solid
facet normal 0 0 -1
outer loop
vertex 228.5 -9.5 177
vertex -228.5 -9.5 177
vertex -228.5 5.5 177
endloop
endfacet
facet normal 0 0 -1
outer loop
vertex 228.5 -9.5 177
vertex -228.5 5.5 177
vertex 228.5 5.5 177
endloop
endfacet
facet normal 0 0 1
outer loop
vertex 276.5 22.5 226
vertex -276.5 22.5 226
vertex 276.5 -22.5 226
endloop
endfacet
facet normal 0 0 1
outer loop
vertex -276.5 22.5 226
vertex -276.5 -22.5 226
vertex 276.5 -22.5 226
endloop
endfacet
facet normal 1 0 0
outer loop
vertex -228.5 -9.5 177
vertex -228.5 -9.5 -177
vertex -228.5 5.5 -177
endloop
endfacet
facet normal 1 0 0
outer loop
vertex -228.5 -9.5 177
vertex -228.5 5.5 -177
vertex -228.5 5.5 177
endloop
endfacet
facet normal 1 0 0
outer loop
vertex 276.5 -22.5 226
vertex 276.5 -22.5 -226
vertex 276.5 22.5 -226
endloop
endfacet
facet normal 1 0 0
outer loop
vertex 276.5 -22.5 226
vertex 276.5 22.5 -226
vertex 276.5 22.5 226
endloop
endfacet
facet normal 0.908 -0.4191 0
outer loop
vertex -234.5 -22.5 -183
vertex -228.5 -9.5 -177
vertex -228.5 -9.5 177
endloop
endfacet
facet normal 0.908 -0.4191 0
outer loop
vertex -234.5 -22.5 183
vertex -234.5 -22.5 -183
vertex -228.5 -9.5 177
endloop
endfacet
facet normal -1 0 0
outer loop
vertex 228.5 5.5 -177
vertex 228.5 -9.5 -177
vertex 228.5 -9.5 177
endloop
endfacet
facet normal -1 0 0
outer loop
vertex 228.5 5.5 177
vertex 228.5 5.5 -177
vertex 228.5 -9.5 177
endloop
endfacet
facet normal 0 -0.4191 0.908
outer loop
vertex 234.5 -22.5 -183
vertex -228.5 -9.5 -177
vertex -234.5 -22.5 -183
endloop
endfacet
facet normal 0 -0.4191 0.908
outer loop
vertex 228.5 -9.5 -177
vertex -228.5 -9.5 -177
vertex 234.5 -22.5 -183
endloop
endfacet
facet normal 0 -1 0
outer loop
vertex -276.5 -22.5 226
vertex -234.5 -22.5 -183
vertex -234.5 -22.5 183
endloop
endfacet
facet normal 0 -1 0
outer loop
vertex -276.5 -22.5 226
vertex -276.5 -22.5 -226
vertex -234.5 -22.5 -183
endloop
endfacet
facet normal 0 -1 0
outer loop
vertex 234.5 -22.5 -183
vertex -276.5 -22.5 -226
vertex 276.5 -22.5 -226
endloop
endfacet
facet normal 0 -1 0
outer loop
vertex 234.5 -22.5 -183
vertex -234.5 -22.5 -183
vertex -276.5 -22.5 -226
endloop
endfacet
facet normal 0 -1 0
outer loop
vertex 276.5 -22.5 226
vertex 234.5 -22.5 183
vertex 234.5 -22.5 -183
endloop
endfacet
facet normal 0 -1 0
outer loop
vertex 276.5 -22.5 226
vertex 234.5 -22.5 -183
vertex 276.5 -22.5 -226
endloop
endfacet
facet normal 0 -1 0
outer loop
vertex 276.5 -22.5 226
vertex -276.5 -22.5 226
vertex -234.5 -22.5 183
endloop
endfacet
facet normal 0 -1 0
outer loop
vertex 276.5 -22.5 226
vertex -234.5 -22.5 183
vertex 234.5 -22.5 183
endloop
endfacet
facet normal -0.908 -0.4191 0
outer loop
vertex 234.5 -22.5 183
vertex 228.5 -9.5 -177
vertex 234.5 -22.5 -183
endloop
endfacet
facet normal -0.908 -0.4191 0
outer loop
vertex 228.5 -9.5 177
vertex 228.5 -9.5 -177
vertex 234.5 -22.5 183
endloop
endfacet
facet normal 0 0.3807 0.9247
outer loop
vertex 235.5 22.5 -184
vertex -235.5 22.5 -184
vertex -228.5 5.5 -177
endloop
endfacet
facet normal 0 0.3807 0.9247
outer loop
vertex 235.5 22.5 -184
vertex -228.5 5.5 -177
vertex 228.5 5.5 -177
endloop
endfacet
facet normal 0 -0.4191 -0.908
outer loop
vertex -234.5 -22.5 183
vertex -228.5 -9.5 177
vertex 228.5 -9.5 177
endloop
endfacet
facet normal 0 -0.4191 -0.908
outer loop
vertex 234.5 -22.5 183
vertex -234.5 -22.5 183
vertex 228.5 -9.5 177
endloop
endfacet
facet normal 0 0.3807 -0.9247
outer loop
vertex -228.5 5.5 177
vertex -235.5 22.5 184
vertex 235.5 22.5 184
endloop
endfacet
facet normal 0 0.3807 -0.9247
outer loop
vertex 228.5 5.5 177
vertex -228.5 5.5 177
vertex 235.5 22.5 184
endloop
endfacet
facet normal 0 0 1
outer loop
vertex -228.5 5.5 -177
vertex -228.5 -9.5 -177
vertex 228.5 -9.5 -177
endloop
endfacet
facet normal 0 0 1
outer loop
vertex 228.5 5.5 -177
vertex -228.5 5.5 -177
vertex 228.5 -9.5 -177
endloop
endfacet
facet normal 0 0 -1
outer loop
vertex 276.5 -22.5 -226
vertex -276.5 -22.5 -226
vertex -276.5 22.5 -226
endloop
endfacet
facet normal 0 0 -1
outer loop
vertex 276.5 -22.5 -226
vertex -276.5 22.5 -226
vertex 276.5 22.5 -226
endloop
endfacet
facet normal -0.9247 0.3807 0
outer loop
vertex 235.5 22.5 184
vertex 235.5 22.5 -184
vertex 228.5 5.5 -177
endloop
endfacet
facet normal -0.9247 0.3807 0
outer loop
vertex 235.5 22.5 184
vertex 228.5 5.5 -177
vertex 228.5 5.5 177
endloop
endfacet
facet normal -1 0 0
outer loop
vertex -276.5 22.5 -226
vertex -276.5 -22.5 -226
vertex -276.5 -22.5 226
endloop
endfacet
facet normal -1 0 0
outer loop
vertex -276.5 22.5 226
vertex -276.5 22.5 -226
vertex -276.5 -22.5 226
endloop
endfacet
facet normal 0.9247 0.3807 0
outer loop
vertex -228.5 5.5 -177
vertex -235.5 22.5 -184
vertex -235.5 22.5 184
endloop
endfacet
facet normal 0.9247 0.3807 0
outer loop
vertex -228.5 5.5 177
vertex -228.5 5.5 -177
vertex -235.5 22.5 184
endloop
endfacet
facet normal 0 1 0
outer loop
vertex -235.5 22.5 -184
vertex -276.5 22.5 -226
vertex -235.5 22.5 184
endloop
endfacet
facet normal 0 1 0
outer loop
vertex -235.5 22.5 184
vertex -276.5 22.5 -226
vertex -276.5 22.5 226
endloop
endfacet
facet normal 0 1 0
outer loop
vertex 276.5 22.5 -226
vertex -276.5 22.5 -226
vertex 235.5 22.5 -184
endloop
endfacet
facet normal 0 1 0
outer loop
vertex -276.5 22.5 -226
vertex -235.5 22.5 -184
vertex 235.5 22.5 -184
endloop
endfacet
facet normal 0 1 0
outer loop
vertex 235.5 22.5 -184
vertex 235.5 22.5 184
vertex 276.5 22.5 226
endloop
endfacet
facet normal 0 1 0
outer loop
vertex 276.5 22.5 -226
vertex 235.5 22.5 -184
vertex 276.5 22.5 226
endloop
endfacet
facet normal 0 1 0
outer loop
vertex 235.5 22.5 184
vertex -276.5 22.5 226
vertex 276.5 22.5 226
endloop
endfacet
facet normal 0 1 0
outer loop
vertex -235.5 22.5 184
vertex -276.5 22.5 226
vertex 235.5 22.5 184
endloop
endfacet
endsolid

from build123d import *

# Parameters (mm, degrees)
F0_W     = 553
F0_H     = 452
F0_W_2   = 457
F0_H_2   = 354
F1_DEPTH = 22.5
F2_SIZE2 = 13
F2_SIZE  = 6
F3_SIZE2 = 7
F3_SIZE  = 17


with BuildPart() as f1:
    # F0 (on Front) → F1 (new body, symmetric)
    with BuildSketch(Plane.XZ):
        Rectangle(F0_W, F0_H)
        Rectangle(F0_W_2, F0_H_2, mode=Mode.SUBTRACT)
    extrude(amount=F1_DEPTH, both=True)

    # F2
    f2_edges = [f1.edges().sort_by_distance(p)[0] for p in [
        (0, -22.5, -177),
        (-228.5, -22.5, 0),
        (228.5, -22.5, 0),
        (0, -22.5, 177),
    ]]
    chamfer(f2_edges, length=F2_SIZE, length2=F2_SIZE2)

    # F3
    f3_edges = [f1.edges().sort_by_distance(p)[0] for p in [
        (0, 22.5, -177),
        (-228.5, 22.5, 0),
        (0, 22.5, 177),
        (228.5, 22.5, 0),
    ]]
    chamfer(f3_edges, length=F3_SIZE, length2=F3_SIZE2)


solid = f1.part
